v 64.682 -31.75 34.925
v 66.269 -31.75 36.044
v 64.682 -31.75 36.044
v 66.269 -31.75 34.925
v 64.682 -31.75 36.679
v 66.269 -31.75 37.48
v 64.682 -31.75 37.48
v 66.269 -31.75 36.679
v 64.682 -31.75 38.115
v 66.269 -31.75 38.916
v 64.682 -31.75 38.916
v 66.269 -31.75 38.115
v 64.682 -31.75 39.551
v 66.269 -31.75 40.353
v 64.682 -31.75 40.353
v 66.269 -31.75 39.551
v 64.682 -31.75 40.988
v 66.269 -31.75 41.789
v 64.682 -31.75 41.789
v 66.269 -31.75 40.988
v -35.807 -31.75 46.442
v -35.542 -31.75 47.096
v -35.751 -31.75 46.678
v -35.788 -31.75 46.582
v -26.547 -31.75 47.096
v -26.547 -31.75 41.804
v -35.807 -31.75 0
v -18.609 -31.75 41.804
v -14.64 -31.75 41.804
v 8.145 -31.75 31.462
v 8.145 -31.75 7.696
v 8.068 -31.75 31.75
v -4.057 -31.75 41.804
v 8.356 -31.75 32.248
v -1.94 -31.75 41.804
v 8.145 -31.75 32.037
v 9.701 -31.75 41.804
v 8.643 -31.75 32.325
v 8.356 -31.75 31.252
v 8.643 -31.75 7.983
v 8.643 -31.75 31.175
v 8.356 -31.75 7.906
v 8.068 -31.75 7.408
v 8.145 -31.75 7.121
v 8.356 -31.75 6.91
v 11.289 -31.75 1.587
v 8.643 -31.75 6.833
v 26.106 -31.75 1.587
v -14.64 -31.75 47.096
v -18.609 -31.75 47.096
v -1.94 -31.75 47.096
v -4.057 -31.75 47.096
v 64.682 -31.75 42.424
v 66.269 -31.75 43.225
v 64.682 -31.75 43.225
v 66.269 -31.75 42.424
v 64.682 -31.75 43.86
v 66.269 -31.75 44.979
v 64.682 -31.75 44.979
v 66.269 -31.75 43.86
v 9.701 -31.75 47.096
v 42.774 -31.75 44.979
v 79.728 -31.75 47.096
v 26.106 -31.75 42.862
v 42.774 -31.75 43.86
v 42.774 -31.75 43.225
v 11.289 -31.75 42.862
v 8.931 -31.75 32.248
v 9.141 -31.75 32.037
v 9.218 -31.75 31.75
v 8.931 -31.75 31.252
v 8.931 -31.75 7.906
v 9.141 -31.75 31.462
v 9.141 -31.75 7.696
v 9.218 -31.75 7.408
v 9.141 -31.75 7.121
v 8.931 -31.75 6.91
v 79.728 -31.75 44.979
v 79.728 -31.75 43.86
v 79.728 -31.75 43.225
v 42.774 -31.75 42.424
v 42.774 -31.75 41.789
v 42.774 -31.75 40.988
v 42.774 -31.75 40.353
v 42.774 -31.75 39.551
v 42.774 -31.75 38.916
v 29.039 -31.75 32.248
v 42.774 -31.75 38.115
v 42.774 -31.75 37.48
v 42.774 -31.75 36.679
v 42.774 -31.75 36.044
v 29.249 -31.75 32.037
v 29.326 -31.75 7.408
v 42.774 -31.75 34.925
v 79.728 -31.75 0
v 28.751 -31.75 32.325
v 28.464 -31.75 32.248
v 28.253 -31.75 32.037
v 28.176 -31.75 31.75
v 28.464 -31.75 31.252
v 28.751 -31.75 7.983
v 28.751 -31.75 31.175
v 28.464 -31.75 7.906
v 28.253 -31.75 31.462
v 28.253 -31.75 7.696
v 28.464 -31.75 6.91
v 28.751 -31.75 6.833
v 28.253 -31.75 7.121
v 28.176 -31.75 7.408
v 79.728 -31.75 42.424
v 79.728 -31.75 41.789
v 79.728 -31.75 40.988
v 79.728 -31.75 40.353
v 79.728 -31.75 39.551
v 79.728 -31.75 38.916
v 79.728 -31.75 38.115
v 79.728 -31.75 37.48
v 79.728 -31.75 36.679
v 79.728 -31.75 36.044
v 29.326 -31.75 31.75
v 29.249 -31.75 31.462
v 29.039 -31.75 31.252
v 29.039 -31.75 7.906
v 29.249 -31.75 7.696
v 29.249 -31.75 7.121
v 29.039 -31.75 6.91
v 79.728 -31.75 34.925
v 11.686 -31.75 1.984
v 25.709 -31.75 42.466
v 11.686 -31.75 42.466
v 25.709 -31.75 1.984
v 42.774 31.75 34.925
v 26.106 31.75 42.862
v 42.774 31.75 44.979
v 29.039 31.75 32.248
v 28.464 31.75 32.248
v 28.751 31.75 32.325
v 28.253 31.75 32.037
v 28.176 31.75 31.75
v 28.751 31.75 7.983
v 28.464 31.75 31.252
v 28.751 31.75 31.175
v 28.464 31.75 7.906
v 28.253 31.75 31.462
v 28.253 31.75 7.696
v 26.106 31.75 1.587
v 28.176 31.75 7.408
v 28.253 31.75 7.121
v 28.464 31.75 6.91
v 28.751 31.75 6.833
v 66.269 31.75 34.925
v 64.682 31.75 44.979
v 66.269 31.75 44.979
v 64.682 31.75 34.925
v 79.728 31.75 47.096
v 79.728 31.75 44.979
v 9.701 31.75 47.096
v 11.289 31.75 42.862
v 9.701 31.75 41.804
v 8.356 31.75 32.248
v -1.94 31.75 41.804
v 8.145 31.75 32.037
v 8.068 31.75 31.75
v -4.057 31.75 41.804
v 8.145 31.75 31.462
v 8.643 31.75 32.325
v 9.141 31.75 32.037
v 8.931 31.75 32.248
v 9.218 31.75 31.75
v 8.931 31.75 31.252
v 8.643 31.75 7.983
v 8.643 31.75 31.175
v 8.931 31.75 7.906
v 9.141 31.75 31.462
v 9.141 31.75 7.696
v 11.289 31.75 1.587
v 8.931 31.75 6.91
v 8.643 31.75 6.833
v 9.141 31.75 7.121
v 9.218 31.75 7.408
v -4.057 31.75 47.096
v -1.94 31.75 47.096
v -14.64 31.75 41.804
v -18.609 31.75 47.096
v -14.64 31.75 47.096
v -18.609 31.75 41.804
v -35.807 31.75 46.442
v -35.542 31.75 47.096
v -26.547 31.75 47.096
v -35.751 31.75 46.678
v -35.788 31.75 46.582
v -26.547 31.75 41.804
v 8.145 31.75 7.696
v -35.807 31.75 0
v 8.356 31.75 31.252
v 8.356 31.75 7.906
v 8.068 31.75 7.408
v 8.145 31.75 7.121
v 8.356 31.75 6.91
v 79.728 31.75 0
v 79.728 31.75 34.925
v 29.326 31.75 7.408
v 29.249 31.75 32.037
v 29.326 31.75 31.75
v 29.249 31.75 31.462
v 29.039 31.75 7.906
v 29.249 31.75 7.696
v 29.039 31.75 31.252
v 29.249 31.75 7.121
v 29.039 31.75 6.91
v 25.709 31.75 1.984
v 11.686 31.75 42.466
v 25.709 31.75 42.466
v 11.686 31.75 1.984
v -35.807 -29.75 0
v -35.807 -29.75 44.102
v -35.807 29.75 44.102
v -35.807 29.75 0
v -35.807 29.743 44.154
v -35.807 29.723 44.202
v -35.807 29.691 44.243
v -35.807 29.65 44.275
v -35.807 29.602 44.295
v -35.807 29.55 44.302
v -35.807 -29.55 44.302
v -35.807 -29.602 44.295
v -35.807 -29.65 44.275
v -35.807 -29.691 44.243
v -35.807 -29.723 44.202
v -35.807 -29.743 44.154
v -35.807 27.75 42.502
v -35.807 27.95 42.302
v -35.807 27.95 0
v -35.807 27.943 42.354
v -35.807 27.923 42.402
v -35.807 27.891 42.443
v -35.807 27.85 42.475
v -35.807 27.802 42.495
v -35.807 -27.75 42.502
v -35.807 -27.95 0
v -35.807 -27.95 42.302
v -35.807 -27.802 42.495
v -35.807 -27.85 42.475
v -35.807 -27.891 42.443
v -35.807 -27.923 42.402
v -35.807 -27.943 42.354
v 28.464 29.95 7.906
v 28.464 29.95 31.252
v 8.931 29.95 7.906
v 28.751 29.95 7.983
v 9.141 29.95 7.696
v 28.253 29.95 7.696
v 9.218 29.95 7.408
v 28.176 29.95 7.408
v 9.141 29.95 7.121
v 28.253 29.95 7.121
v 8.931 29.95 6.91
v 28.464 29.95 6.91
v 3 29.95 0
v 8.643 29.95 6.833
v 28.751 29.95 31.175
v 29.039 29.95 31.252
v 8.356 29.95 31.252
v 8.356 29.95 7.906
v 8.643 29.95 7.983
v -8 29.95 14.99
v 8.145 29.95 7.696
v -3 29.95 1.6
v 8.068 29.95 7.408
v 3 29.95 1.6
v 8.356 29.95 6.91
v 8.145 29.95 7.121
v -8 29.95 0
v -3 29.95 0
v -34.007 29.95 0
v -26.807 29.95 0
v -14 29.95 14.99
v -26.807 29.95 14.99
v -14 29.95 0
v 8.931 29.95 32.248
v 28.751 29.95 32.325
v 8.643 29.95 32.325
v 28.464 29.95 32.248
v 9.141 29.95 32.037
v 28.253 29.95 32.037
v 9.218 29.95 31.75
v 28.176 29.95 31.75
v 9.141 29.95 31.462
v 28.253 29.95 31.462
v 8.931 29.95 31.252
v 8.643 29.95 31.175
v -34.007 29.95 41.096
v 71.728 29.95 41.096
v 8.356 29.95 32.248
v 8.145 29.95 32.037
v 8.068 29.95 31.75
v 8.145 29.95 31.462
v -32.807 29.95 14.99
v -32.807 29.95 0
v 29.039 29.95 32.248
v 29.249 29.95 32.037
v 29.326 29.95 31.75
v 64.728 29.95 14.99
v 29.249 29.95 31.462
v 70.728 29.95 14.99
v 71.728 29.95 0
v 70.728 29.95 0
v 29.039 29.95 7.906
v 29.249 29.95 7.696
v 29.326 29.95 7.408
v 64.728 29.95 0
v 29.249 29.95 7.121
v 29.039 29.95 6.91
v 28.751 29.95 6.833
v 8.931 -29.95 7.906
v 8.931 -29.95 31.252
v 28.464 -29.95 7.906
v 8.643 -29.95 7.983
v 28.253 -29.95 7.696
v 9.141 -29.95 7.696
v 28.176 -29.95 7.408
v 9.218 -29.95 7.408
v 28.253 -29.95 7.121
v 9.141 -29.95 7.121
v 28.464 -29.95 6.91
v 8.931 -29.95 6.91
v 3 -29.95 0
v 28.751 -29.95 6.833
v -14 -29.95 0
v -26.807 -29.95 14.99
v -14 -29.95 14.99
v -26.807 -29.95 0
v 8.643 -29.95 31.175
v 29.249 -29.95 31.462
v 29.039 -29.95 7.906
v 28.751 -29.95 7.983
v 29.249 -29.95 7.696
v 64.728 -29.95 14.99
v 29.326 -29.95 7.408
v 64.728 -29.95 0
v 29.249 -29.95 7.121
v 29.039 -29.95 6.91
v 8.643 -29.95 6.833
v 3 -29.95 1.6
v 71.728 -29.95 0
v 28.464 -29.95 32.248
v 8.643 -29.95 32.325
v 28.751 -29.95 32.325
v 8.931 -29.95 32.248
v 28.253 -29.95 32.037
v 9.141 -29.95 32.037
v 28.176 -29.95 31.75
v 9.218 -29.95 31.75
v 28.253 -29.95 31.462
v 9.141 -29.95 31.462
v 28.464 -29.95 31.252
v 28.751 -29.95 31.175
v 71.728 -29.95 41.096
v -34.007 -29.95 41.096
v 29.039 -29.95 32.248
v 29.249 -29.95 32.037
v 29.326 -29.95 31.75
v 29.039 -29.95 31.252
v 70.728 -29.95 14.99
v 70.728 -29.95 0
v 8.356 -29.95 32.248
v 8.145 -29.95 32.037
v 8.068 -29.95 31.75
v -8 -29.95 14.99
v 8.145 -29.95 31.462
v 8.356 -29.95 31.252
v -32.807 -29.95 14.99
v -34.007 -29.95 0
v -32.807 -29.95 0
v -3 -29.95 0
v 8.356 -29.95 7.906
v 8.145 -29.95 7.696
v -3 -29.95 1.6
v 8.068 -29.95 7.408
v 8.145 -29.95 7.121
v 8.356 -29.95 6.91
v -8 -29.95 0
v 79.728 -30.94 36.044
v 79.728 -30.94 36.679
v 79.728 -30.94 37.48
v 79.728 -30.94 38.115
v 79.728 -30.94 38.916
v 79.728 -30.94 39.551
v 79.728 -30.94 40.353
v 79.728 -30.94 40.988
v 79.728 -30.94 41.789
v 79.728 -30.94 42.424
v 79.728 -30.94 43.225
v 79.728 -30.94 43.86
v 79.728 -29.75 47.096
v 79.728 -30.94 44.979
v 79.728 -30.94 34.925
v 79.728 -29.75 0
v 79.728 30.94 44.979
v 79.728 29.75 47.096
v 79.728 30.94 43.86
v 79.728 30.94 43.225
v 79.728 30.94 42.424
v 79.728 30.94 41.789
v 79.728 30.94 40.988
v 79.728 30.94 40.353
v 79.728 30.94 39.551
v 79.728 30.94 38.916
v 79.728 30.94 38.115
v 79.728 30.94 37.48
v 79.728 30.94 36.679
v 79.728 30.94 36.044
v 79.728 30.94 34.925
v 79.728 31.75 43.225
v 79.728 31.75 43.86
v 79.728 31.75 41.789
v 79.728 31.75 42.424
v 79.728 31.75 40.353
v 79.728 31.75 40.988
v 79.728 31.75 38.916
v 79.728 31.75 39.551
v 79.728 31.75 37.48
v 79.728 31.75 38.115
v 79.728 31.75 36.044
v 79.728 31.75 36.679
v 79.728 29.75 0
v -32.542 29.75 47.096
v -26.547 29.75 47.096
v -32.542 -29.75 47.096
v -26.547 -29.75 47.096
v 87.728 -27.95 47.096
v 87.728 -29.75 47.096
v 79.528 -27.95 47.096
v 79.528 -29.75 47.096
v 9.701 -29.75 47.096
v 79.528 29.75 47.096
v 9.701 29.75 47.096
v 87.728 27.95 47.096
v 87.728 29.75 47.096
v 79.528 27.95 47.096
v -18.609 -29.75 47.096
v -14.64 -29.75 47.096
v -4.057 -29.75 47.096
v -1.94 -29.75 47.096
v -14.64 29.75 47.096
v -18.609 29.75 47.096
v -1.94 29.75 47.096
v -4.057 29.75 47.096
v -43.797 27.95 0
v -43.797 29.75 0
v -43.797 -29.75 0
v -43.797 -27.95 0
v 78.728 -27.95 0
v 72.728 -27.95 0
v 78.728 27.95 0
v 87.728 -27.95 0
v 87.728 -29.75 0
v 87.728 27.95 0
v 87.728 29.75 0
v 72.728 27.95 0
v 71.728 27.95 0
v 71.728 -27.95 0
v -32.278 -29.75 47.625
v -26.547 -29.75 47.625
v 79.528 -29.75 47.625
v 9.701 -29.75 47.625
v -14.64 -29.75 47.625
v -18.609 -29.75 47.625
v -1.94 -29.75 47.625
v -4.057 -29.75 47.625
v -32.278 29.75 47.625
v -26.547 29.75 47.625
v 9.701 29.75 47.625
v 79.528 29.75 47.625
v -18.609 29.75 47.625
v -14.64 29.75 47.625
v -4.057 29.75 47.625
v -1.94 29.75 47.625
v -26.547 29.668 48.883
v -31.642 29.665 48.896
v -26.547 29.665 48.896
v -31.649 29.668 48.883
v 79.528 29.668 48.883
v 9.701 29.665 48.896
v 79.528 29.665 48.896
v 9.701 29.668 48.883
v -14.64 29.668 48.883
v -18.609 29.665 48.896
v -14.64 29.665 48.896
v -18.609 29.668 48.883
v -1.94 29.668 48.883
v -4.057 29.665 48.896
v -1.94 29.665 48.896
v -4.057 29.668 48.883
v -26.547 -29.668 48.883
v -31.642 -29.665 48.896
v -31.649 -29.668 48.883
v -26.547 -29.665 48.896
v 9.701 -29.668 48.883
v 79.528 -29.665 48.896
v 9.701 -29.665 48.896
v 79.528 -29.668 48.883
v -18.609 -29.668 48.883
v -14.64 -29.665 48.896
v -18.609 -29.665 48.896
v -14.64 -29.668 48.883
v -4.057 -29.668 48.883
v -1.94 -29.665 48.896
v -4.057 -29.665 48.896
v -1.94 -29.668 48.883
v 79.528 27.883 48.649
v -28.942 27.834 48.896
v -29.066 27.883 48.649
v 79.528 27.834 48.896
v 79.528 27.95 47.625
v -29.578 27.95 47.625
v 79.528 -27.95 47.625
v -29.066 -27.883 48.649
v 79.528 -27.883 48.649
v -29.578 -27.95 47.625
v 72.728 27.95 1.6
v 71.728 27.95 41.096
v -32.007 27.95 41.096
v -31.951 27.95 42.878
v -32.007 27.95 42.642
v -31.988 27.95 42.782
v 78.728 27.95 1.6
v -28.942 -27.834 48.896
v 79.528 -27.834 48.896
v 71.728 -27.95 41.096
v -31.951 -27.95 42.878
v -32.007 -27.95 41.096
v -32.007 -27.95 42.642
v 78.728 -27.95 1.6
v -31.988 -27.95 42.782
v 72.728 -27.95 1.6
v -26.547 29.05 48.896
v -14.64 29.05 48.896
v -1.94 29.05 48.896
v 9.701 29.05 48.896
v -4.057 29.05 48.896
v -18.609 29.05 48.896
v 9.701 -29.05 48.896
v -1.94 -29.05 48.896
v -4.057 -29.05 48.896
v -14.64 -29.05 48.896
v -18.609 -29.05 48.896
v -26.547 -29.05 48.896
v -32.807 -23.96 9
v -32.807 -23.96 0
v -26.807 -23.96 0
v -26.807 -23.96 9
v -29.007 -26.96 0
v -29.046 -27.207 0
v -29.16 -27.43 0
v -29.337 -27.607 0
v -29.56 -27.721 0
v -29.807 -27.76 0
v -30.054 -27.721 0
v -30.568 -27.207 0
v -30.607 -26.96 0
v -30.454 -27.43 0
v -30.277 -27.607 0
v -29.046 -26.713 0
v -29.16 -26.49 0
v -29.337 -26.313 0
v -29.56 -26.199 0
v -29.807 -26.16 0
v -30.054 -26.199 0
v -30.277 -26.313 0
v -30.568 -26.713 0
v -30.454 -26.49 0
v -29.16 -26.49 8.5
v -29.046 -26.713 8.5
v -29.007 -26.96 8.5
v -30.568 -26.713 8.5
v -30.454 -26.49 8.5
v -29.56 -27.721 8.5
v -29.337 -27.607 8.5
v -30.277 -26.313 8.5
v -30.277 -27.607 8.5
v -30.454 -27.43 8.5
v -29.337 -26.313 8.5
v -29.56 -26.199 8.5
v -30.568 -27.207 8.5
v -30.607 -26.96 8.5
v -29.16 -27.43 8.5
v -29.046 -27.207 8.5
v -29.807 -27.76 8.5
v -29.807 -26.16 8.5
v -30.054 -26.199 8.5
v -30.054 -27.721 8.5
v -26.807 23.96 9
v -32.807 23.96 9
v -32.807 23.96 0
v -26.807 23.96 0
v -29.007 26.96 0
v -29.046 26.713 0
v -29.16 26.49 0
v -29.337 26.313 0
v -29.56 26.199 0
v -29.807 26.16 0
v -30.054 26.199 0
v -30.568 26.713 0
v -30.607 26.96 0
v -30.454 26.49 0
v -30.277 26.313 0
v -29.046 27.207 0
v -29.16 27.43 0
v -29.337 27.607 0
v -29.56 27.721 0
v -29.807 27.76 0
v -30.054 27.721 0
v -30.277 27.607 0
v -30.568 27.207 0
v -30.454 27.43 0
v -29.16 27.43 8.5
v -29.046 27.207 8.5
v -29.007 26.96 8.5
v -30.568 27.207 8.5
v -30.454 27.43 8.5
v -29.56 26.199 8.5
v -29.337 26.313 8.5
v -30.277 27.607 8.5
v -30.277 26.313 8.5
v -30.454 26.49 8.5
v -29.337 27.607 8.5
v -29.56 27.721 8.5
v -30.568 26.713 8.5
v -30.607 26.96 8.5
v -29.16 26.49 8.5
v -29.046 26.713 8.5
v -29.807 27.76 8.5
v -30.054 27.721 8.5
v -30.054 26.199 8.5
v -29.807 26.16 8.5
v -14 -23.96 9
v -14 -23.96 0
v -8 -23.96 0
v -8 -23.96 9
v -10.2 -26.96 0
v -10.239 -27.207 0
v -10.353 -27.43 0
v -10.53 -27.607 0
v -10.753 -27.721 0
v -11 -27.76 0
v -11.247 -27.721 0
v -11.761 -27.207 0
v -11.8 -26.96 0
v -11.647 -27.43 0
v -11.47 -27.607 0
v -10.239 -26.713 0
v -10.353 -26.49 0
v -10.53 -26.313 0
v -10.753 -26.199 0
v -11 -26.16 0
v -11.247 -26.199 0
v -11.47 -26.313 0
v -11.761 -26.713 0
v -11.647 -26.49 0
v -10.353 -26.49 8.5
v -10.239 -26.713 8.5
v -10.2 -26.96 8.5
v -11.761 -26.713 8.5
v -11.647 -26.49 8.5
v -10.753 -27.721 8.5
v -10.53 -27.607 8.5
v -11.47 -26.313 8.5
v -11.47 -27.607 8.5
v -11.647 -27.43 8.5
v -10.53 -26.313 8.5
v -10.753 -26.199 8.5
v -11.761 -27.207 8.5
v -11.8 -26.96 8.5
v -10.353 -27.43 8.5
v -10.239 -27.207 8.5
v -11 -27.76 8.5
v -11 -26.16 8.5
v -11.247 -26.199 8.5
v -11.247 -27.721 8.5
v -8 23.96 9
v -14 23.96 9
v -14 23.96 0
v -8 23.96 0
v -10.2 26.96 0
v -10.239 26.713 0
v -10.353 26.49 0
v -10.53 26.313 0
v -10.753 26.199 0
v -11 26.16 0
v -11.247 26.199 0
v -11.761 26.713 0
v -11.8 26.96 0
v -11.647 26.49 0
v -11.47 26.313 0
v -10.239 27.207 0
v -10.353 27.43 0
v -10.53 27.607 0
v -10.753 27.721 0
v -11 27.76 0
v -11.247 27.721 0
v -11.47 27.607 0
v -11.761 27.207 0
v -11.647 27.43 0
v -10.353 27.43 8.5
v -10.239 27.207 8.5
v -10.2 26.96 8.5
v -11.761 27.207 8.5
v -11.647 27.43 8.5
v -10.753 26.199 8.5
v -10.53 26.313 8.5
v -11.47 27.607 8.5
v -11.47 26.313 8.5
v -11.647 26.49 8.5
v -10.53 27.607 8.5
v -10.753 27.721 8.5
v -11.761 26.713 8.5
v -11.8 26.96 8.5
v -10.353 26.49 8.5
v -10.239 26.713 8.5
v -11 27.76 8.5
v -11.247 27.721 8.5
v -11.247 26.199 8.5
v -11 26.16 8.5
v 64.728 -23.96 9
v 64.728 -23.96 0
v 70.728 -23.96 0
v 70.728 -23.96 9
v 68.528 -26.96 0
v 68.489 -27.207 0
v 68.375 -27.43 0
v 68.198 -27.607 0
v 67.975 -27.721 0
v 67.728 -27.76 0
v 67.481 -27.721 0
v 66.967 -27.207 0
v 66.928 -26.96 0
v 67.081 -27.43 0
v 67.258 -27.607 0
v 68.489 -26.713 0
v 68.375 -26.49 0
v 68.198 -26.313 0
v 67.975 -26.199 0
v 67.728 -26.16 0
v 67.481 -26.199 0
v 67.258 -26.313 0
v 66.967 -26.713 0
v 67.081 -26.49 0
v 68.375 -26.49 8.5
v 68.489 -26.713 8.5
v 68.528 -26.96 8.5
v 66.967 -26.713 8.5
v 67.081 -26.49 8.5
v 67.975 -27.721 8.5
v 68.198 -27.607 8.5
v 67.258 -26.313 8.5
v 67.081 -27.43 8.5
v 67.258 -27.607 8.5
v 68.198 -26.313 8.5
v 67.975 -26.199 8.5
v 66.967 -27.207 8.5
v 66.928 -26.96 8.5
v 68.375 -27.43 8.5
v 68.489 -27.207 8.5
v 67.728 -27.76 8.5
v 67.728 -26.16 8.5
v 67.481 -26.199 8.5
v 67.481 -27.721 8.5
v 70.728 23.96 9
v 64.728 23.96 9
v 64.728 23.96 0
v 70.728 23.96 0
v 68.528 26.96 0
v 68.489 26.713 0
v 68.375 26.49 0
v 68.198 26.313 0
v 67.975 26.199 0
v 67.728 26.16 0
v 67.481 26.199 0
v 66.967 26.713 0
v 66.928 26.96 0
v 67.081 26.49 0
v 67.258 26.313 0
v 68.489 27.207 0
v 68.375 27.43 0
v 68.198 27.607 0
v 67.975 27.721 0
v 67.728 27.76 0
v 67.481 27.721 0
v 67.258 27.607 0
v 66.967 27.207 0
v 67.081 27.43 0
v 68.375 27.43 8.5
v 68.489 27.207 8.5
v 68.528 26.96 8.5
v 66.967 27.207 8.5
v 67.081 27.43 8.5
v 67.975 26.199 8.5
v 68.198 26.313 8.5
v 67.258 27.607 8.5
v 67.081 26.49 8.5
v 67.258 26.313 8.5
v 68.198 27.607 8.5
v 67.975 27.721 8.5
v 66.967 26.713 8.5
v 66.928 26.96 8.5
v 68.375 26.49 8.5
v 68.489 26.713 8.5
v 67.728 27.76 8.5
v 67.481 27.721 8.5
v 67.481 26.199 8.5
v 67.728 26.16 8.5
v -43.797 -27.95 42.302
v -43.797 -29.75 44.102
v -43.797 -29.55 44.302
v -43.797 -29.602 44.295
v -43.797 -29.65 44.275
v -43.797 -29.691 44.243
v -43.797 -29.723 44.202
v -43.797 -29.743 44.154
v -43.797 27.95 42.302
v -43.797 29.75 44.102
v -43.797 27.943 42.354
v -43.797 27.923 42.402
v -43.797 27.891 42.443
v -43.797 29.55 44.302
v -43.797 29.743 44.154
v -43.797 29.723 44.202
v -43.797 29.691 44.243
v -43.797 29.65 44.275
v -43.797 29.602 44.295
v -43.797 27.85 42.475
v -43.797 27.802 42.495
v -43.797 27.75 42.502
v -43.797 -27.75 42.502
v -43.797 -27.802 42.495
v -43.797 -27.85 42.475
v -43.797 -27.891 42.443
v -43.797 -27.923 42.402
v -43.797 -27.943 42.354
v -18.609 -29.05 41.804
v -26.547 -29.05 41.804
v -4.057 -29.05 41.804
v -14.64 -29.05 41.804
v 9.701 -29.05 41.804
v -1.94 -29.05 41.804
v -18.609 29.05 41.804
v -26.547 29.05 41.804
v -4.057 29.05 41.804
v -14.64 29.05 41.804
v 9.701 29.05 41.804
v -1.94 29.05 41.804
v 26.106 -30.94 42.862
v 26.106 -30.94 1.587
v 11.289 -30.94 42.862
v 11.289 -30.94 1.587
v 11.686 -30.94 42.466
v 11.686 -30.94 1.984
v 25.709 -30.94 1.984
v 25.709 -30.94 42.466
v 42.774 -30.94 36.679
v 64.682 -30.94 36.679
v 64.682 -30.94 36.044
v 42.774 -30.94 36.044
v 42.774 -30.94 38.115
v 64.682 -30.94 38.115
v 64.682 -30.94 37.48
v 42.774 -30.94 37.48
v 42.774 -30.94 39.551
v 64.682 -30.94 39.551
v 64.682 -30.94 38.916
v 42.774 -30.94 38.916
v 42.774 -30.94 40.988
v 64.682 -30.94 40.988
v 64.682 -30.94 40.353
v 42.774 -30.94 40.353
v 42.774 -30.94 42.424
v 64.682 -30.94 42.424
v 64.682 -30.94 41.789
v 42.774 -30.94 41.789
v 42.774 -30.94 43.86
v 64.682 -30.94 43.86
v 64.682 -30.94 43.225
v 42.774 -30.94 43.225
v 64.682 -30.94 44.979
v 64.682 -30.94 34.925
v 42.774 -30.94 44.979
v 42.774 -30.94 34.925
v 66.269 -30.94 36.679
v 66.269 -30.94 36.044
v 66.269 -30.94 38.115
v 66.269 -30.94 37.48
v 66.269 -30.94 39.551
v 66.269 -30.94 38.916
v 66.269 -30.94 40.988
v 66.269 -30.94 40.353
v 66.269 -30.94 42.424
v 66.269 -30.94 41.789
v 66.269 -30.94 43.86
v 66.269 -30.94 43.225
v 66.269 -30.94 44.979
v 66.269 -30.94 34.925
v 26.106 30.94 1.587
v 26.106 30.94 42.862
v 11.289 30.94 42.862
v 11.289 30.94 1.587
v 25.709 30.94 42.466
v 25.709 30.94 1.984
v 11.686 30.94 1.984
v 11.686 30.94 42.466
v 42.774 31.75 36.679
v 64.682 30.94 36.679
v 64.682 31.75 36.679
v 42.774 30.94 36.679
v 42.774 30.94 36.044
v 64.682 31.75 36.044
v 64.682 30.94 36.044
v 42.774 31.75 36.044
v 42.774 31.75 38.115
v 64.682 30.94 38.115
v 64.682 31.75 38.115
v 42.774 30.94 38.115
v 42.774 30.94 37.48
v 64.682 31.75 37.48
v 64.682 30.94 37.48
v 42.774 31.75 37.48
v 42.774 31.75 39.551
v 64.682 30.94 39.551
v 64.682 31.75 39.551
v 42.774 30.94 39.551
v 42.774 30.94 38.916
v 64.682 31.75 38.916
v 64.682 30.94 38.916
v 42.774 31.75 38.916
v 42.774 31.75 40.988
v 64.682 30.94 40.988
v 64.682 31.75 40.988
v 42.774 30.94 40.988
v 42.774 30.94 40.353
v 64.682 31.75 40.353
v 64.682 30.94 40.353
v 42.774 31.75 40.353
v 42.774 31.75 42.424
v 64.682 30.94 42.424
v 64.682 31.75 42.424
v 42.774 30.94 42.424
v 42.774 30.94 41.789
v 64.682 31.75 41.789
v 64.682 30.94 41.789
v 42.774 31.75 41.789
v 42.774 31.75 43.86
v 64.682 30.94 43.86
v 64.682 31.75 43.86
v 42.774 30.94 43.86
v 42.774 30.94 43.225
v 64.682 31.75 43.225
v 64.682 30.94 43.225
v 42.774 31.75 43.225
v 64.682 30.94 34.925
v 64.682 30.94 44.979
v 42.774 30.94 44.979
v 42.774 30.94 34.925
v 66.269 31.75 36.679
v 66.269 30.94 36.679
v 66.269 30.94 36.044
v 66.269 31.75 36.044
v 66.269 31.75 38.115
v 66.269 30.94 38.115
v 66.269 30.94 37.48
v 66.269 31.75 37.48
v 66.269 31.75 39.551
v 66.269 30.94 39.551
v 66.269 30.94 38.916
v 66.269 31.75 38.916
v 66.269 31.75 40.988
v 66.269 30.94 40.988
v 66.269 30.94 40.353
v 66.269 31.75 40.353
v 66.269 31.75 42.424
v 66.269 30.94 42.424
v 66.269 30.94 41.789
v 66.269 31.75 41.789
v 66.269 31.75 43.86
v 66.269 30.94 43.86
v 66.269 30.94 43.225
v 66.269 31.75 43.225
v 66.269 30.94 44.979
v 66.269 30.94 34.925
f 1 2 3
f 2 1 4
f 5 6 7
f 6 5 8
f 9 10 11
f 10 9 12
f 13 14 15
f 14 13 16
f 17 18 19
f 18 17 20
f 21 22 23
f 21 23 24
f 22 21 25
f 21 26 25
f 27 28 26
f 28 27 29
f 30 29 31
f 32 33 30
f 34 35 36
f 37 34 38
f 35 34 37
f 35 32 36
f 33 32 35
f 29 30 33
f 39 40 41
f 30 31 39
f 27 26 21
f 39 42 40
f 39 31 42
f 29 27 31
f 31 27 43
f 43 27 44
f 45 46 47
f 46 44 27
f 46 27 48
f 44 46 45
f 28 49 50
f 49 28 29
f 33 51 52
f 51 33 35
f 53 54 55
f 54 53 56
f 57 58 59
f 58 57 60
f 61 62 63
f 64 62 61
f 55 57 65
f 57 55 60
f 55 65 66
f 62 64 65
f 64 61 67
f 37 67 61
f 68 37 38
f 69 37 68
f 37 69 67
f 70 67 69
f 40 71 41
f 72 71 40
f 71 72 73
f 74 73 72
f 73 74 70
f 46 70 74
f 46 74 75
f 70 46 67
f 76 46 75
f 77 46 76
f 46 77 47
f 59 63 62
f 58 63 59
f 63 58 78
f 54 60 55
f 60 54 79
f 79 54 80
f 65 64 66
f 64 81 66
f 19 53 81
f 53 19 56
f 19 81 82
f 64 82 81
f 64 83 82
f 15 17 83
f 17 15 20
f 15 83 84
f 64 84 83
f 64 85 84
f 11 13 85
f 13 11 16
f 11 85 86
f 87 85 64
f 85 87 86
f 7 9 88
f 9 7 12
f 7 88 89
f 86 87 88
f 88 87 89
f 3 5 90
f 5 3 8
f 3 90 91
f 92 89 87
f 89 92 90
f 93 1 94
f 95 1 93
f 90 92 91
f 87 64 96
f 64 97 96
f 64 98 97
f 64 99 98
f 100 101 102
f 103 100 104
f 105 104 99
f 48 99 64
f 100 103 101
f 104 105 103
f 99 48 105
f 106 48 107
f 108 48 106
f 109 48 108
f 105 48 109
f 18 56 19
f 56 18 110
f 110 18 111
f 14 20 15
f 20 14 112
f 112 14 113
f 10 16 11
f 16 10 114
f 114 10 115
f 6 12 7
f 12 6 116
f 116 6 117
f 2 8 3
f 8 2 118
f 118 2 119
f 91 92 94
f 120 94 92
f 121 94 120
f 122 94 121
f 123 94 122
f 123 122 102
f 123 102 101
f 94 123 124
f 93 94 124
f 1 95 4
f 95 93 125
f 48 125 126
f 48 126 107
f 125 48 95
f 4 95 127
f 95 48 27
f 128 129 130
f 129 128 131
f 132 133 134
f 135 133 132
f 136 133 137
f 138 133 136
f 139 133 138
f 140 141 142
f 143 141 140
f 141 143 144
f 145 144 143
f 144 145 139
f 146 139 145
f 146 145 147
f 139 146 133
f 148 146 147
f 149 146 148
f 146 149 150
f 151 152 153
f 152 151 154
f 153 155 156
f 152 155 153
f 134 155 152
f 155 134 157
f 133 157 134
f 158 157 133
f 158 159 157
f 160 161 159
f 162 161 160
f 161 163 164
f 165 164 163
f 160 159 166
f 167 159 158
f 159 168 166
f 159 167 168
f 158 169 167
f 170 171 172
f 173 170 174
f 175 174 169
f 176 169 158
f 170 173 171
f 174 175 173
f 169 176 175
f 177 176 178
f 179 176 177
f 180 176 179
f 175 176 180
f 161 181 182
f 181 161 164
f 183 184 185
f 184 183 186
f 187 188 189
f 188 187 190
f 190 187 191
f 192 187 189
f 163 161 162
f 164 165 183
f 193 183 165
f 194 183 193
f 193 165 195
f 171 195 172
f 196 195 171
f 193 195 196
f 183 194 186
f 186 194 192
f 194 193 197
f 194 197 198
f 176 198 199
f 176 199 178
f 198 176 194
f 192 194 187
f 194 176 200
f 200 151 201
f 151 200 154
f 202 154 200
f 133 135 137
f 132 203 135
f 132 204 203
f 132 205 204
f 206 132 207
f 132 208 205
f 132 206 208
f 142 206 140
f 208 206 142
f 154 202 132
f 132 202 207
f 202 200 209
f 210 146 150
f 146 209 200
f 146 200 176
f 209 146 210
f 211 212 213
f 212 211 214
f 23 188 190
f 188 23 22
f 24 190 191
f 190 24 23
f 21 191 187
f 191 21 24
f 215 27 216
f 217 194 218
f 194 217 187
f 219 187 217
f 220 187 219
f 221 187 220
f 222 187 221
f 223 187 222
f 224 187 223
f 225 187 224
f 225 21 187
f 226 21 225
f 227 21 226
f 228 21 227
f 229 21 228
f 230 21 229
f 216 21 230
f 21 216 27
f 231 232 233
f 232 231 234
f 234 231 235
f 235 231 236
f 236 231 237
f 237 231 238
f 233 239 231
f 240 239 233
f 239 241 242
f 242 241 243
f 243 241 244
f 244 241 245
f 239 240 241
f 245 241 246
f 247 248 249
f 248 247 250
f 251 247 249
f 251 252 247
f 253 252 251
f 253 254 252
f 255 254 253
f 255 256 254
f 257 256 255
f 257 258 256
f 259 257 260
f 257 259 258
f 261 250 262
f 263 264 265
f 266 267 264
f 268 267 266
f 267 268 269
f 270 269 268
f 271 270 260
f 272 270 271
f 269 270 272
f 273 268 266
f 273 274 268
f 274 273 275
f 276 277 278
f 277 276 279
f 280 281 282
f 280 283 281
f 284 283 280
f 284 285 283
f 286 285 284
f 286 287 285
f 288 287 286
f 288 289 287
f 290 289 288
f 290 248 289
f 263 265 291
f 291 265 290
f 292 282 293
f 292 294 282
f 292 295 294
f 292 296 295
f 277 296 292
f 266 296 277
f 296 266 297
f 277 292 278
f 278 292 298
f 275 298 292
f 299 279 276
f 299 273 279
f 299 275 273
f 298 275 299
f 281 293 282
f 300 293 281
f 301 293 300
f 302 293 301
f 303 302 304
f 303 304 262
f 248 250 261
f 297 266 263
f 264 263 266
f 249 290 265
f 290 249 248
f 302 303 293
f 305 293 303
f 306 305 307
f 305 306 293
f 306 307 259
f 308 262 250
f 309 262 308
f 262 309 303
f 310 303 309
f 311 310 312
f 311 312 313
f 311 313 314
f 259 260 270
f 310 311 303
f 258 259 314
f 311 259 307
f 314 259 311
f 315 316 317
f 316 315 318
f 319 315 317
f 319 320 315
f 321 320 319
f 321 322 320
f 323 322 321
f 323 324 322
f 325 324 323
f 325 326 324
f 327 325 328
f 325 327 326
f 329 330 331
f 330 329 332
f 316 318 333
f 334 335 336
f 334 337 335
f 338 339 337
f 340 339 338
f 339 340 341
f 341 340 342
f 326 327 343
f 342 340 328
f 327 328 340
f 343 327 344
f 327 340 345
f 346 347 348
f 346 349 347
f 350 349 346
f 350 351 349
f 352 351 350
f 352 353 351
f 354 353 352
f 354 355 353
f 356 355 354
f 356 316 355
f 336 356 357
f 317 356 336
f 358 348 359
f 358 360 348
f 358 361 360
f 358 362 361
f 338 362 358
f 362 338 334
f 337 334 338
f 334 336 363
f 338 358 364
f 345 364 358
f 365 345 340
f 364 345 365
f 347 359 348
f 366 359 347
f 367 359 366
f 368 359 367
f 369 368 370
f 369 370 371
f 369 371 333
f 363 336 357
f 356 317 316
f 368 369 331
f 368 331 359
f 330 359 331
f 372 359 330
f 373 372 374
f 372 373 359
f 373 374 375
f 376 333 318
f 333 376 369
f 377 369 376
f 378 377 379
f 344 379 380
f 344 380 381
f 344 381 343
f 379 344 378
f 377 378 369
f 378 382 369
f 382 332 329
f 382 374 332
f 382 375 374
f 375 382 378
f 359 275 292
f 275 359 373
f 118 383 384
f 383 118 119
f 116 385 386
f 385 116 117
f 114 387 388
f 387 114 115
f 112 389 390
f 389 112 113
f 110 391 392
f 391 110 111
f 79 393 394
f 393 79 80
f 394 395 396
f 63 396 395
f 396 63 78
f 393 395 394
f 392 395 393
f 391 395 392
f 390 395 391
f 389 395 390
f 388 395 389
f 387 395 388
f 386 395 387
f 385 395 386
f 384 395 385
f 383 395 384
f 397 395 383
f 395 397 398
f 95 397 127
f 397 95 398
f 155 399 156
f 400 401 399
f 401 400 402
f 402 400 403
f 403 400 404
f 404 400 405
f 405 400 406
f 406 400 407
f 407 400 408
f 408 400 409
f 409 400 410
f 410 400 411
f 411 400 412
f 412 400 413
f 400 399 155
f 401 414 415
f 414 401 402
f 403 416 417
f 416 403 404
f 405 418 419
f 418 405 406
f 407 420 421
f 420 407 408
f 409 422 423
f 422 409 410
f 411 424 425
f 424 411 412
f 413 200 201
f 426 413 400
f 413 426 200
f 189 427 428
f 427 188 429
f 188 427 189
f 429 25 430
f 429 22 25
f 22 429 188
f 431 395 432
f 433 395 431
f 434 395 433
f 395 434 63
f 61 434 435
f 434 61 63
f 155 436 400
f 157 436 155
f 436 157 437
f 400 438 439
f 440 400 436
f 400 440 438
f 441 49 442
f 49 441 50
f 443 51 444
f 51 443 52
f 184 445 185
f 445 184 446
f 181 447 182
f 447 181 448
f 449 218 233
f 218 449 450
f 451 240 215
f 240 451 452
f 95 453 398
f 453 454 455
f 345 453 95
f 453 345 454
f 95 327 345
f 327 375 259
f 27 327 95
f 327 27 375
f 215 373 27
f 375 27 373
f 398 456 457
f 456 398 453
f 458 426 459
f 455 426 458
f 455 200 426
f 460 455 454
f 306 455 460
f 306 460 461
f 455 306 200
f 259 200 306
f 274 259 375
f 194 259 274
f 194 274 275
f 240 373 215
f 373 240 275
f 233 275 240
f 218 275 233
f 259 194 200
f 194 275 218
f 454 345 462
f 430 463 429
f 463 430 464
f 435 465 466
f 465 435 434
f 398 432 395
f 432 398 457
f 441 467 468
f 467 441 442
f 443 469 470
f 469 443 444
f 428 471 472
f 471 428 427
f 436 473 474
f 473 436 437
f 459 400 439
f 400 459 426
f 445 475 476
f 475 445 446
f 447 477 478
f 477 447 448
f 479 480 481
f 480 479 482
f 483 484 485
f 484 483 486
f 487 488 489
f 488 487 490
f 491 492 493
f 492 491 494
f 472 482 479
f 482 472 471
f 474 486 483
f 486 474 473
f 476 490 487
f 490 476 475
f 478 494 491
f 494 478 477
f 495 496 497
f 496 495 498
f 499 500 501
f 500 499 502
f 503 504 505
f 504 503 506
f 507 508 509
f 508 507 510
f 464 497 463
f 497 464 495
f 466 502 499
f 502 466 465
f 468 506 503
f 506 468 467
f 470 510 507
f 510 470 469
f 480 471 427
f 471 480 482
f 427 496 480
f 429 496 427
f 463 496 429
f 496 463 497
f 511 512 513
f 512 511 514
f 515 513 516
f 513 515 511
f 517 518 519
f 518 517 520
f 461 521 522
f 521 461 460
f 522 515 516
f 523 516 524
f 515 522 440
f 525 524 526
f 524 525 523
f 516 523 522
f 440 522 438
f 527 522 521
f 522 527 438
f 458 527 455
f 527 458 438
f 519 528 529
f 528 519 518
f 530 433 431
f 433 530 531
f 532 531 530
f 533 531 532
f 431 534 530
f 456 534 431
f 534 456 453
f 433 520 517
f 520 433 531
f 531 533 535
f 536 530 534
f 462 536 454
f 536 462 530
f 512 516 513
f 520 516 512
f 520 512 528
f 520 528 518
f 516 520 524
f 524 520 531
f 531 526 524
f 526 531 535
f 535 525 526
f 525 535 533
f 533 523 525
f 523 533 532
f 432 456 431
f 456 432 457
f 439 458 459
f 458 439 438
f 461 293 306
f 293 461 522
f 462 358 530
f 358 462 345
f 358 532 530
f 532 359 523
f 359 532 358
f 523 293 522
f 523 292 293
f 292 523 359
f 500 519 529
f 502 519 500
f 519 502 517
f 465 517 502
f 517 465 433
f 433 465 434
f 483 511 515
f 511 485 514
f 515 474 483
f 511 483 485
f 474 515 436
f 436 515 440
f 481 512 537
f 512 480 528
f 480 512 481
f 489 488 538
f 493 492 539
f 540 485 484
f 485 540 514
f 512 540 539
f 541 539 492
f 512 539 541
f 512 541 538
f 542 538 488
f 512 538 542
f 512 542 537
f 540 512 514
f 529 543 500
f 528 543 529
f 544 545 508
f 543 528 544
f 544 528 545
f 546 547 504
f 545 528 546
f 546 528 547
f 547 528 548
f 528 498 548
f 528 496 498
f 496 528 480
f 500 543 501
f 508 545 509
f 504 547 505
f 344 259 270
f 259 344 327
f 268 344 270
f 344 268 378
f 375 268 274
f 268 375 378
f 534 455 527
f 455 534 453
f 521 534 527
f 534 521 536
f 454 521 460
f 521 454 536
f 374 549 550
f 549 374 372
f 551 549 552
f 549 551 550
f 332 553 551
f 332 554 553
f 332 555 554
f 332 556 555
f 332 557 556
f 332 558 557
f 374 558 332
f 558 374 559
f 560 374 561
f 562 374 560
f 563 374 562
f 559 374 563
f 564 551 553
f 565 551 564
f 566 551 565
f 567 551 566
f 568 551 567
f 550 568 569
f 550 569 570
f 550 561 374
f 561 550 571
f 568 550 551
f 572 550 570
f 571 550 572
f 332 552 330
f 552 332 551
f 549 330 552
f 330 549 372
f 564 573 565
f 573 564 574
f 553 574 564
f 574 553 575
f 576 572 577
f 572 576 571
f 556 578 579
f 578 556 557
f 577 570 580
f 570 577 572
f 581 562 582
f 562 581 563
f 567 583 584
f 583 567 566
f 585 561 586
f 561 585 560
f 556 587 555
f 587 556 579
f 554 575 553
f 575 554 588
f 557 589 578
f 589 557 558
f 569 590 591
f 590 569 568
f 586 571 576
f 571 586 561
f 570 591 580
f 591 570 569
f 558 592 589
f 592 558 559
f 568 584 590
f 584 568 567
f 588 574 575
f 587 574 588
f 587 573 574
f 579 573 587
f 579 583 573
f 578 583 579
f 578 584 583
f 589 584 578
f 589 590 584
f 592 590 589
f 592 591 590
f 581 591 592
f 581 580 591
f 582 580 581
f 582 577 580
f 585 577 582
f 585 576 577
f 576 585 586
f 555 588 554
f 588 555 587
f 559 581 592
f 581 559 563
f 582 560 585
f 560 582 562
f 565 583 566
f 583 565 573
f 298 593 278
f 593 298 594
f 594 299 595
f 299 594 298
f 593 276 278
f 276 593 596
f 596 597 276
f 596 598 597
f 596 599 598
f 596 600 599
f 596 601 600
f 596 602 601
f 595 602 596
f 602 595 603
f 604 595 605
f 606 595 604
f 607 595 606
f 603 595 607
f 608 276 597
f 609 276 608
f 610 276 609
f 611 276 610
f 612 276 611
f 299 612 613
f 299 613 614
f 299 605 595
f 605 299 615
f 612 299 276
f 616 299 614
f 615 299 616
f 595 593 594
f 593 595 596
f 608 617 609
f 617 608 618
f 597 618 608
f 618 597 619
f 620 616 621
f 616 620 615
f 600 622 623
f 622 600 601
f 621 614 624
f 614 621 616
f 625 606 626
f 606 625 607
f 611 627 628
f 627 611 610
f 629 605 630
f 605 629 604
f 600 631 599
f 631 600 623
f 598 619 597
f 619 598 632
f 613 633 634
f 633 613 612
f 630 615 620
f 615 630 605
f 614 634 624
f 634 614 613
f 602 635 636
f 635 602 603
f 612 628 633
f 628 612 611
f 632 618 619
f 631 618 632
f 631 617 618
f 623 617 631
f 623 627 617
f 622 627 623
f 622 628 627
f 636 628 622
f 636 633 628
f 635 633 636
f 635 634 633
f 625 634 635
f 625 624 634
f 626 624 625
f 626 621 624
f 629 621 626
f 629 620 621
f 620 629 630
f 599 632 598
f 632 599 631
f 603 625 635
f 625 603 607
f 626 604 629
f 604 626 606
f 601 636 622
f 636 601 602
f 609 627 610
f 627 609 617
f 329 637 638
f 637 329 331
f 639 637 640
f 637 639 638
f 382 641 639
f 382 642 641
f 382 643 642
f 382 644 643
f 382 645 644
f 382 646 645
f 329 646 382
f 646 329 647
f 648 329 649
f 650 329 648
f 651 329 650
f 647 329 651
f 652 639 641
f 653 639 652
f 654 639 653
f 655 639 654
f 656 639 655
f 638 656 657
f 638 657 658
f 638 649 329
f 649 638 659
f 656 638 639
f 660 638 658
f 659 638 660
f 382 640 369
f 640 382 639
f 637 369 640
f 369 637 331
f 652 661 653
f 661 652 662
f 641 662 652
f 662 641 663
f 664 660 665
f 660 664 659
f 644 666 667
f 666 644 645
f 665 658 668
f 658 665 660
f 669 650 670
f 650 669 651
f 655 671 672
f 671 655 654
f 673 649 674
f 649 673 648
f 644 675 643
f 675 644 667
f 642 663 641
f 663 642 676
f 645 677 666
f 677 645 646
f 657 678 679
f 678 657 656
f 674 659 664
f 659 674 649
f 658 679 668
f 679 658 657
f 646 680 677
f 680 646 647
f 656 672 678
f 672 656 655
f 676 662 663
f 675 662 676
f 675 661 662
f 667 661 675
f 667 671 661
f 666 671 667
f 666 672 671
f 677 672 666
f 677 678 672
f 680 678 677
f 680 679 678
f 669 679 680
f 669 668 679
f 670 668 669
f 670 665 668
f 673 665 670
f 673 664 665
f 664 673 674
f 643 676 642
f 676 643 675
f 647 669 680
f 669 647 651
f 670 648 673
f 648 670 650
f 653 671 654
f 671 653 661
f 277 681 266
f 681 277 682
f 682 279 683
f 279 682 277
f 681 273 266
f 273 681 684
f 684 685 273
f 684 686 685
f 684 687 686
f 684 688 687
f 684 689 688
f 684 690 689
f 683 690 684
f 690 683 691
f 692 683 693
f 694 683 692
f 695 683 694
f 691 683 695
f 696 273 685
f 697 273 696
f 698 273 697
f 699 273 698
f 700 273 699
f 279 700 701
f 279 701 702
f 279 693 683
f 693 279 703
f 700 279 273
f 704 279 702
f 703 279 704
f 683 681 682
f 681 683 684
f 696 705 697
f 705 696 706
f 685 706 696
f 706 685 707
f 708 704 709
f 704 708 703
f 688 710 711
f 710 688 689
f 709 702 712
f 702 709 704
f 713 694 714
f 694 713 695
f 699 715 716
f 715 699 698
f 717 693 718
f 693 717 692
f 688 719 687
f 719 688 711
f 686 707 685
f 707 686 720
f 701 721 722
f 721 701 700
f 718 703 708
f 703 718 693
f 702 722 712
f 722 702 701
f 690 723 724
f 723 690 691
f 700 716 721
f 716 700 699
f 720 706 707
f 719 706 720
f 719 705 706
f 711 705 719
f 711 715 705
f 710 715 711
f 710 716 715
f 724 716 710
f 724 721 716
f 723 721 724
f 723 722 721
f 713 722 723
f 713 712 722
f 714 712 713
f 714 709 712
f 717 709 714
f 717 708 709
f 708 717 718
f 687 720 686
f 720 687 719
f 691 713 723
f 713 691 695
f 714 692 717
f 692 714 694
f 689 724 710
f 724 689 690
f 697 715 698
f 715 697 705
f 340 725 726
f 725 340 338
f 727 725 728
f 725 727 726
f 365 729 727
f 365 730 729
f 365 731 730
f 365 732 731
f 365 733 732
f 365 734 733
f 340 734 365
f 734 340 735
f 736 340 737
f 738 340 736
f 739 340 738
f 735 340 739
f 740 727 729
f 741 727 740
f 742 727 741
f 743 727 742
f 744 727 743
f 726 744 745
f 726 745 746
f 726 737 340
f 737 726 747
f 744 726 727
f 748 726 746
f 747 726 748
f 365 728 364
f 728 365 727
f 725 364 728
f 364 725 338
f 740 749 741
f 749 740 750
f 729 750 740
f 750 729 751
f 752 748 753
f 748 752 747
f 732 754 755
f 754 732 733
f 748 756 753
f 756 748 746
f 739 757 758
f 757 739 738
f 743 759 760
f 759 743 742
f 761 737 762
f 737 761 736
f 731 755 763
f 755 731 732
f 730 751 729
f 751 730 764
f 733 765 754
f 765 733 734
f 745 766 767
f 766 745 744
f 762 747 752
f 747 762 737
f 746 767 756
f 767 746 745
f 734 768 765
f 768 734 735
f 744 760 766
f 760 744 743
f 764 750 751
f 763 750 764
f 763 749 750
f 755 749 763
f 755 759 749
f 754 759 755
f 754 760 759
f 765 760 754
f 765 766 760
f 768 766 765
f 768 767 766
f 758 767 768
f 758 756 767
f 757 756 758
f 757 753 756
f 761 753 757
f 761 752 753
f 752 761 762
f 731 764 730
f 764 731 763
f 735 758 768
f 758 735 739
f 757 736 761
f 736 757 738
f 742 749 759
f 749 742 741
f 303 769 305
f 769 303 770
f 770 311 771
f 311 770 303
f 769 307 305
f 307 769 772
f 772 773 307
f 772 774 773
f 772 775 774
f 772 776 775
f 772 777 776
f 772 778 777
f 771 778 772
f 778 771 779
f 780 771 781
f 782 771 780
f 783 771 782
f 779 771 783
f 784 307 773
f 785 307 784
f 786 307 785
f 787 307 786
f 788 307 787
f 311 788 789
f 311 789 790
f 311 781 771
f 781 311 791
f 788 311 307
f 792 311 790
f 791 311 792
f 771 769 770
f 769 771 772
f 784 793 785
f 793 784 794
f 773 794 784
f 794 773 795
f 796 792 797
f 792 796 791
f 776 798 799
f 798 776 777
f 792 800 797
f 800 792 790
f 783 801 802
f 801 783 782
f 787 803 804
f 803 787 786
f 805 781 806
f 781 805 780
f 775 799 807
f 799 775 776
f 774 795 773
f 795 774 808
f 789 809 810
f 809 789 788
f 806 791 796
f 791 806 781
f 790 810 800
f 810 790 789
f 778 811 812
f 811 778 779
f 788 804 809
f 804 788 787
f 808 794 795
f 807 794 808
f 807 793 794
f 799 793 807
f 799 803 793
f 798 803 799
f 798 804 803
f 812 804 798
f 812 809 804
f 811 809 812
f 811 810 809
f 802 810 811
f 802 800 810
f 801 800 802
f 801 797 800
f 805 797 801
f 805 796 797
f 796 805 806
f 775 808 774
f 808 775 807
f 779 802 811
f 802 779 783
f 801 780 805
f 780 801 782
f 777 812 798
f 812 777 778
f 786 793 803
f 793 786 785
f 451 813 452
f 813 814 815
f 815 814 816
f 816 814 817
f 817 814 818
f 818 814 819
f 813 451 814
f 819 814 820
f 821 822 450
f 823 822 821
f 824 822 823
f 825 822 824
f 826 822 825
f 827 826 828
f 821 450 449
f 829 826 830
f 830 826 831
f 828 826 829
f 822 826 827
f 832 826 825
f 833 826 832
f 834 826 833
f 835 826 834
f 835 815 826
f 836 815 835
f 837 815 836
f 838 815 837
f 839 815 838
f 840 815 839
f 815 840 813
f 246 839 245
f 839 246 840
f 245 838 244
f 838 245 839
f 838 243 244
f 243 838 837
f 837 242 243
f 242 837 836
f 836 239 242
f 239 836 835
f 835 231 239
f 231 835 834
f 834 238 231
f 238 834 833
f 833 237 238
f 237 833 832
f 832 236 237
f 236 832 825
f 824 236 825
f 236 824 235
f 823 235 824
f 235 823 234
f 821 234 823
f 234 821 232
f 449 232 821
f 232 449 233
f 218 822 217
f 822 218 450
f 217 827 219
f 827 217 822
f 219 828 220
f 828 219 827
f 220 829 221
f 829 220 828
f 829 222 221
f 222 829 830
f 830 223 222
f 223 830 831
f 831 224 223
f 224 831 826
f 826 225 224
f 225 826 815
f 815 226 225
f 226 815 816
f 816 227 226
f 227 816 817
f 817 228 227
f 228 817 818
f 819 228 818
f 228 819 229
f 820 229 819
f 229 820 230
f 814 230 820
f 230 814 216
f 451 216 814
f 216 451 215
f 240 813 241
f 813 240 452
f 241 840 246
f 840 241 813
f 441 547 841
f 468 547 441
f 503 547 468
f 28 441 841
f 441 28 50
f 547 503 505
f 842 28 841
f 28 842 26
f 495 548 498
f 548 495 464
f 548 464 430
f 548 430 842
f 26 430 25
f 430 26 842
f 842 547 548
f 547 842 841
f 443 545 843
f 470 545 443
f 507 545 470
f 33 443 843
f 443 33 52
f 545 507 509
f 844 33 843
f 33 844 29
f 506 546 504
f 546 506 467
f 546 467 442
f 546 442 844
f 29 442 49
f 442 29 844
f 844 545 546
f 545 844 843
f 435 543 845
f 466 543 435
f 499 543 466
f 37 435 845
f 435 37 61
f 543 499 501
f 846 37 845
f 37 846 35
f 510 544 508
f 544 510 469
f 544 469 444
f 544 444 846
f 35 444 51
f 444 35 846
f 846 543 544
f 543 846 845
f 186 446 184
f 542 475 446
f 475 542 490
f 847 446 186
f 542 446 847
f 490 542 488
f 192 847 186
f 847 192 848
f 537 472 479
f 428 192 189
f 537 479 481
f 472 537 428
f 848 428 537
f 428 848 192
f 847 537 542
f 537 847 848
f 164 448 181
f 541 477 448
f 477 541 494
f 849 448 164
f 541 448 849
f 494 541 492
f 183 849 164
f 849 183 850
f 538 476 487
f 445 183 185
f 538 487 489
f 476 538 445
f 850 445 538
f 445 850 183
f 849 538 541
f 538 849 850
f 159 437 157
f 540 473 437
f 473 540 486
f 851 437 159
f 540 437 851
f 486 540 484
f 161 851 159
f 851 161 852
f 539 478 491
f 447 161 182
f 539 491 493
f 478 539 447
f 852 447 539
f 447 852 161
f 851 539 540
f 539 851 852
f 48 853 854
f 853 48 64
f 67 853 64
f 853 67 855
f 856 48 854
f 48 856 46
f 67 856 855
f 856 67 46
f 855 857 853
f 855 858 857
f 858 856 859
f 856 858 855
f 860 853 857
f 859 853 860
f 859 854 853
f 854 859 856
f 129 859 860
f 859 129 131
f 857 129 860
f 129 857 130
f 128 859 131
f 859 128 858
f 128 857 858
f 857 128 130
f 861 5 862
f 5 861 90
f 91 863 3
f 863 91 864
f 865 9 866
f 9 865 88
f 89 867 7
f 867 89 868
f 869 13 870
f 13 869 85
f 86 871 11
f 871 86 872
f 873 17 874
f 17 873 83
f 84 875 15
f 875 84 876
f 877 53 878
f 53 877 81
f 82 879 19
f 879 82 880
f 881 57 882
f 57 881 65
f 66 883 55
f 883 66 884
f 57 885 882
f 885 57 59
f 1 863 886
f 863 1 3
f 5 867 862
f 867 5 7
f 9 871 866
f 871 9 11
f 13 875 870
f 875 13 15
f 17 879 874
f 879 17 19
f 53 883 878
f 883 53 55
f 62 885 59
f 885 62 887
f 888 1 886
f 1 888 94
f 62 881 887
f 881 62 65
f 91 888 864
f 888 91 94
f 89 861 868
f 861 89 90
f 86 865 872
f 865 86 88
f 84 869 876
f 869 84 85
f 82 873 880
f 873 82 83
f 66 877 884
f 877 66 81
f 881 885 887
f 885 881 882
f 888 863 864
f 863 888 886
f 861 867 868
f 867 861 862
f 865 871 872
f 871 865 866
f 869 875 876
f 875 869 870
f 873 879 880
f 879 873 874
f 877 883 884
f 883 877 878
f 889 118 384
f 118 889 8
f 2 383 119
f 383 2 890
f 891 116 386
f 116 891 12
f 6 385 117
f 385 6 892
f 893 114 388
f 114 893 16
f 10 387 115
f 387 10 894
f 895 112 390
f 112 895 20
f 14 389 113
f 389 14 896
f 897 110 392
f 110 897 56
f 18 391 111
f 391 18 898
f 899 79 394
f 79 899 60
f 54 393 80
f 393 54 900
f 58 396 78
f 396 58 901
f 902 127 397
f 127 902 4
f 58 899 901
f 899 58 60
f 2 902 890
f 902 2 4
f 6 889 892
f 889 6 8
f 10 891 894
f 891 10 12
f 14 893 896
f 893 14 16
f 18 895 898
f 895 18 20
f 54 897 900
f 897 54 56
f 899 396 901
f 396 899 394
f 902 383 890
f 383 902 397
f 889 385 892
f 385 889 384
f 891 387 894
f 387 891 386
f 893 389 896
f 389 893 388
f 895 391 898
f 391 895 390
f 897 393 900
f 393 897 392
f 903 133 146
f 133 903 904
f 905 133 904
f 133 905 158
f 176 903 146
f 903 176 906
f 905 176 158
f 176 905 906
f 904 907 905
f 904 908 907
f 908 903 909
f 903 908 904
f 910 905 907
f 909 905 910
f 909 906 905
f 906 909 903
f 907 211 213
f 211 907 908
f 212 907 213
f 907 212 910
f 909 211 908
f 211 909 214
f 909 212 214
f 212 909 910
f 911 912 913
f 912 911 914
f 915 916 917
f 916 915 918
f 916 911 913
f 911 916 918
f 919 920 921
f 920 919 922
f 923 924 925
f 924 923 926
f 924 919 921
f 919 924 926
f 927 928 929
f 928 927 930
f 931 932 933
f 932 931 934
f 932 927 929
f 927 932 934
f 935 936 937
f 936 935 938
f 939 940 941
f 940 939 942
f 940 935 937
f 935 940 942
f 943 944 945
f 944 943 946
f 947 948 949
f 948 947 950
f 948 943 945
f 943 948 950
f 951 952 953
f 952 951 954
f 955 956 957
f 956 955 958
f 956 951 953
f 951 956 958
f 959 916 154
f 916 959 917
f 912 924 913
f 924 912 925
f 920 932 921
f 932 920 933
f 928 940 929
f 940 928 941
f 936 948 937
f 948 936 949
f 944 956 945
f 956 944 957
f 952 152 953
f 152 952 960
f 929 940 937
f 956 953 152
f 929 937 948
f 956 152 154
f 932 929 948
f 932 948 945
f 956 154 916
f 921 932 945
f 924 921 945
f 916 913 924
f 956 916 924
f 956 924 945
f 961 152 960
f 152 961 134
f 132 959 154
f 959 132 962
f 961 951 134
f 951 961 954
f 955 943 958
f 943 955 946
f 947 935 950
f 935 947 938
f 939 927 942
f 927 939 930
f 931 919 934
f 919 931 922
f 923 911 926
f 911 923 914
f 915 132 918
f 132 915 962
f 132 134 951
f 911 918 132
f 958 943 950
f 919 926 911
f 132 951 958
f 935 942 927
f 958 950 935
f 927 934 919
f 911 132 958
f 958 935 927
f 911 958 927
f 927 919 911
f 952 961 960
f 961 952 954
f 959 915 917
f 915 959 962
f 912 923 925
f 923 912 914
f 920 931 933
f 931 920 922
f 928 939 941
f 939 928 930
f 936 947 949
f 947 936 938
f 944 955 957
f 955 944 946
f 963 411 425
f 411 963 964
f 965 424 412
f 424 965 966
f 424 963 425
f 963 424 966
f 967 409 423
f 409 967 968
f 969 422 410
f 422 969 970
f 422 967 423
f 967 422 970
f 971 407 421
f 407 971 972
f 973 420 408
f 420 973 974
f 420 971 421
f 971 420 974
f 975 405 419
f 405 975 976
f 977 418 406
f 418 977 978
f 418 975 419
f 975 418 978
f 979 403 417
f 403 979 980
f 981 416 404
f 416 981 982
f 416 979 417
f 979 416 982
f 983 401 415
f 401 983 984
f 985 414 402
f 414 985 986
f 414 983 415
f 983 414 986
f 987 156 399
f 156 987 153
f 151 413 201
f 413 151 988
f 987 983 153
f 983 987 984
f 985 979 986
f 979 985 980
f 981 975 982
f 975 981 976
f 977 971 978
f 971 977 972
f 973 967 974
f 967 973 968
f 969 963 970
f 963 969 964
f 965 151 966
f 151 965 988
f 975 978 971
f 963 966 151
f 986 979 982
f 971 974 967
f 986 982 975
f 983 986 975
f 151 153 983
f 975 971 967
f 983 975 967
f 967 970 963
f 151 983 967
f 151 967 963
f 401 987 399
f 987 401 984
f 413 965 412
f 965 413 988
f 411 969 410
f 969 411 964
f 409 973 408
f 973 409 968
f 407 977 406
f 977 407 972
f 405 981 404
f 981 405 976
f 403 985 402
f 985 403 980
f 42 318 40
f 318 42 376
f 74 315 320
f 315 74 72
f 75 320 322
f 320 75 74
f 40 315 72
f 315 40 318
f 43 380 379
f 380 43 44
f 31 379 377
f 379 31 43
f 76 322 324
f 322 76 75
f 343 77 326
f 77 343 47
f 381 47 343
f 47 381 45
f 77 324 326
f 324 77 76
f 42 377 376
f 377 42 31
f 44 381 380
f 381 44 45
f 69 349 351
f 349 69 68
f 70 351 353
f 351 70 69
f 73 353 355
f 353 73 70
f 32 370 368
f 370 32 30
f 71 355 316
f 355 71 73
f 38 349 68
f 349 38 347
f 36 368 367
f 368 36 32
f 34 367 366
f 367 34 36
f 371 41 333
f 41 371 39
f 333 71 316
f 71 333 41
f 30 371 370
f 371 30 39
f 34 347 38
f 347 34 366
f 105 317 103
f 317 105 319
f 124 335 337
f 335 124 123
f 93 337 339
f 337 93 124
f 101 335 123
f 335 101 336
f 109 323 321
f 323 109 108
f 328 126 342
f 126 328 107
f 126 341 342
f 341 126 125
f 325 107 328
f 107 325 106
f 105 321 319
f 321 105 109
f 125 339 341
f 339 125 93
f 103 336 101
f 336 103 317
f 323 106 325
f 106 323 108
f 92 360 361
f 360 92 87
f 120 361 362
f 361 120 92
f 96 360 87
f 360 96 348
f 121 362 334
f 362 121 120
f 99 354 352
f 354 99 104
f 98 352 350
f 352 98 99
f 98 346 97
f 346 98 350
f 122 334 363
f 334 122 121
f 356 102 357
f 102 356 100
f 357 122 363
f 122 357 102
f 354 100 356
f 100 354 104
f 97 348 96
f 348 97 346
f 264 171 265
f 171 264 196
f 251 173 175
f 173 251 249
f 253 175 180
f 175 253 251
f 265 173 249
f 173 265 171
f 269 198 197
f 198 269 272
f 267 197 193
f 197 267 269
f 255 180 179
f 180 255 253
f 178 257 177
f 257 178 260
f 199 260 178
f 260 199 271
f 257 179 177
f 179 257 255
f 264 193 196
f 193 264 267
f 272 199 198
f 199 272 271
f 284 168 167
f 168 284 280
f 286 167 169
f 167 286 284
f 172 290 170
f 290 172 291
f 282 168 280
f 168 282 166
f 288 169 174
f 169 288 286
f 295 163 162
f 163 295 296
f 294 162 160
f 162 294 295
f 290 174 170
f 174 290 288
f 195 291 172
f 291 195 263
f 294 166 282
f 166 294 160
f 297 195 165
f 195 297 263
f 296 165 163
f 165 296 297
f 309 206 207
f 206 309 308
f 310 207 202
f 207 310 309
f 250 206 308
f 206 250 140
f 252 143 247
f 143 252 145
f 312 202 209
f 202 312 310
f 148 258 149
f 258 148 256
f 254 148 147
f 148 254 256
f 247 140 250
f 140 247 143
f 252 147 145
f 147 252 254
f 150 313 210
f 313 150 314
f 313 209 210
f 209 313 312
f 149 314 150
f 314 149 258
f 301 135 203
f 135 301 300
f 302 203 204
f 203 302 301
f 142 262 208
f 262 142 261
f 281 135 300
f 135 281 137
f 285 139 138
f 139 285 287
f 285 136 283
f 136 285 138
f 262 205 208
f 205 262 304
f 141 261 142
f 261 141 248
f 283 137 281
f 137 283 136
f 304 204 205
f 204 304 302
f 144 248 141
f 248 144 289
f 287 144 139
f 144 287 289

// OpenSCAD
// Milwaukee Road Little Joe, O scale 1-48 - print 1 of 17: body_1 - sides and ends, section 1 (print upright)
// Render (F6), export STL, print. Settings: ../../library/lj_params.scad
// Whole loco preview and notes: ../../MILW_LittleJoe_Main.scad
SCALE_SEL = "O";
LOCO_SEL = "E70";   // [E20, E21, E70, E71, E72, E73, E74, E75, E76, E77, E78, E79] the body and roof change for E20 / E21
include <../../library/lj_all.scad>
lj_plate("body_1");
